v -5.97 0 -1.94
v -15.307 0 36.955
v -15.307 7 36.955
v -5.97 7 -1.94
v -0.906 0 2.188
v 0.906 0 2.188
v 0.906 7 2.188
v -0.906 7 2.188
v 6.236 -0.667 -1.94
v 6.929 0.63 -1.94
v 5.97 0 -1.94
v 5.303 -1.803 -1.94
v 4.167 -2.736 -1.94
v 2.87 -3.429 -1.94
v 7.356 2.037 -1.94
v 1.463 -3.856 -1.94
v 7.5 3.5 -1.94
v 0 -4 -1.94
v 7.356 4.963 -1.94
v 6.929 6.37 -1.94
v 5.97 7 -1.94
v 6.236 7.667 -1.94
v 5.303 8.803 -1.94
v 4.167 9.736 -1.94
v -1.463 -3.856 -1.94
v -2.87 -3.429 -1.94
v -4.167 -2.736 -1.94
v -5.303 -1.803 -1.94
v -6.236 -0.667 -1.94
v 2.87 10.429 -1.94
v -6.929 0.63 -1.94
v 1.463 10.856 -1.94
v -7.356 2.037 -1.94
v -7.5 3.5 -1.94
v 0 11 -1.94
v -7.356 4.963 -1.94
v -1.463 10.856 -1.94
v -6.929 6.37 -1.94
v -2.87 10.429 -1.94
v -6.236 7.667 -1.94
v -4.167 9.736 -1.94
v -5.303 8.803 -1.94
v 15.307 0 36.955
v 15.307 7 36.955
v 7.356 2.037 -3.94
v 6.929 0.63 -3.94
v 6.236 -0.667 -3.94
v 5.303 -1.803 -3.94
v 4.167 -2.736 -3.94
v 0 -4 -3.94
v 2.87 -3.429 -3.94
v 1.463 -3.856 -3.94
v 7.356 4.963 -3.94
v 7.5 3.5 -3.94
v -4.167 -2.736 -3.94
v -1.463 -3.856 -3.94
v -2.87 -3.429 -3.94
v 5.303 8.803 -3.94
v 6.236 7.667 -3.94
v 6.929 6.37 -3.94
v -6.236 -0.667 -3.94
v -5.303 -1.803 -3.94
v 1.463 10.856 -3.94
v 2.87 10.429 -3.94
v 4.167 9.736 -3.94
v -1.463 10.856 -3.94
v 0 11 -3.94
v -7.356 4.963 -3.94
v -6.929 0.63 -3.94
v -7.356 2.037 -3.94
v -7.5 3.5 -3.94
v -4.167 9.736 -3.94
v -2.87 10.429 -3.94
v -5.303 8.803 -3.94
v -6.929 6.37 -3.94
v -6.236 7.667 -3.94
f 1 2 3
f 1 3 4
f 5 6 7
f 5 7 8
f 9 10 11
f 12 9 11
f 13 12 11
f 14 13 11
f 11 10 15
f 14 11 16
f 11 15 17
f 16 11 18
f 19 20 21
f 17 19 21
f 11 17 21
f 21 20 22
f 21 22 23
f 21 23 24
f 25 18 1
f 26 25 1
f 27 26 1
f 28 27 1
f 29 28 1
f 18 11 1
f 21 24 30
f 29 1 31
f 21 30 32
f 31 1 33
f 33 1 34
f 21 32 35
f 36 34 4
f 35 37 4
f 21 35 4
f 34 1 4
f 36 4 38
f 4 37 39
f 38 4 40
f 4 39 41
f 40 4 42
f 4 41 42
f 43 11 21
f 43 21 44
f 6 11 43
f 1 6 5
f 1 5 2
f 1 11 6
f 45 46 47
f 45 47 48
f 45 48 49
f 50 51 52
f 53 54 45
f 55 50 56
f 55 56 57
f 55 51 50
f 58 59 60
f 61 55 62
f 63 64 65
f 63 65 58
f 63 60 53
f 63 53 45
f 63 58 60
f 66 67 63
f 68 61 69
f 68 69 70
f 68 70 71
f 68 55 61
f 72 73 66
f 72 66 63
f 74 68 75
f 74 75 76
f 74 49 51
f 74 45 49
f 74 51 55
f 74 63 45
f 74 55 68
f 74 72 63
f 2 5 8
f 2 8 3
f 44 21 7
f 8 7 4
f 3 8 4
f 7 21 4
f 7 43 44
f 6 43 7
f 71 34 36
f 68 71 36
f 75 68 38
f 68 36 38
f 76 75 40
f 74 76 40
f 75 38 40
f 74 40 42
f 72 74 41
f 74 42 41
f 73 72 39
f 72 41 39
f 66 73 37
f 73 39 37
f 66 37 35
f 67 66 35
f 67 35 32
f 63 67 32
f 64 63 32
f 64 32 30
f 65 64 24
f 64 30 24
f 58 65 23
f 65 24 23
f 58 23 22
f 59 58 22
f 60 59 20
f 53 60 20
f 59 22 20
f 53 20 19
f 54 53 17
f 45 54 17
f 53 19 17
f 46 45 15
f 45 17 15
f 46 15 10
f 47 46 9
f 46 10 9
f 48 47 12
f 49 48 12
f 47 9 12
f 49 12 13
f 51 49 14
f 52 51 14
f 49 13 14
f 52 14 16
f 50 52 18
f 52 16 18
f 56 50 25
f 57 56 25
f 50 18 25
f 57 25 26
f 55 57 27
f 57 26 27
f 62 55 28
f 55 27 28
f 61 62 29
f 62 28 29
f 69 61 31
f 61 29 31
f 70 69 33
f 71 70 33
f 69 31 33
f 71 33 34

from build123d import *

# Parameters (mm, degrees)
BOSS_EXTRUDE1_DEPTH = 7
SKETCH2_R           = 7.5
BOSS_EXTRUDE2_DEPTH = 2


with BuildPart() as part:
    # Sketch1 → Boss-Extrude1 (new body)
    with BuildSketch(Plane(origin=(0, 0, 0), x_dir=(1, 0, 0), z_dir=(0, 1, 0))):
        Polygon((-15.307337295, -36.9551813), (-5.96952274, 1.939615515), (5.96952274, 1.939615515), (15.307337295, -36.9551813), (0.906459551, -2.188386941), (-0.906459551, -2.188386941), align=None)
    extrude(amount=BOSS_EXTRUDE1_DEPTH)

    # Sketch2 → Boss-Extrude2 (add)
    with BuildSketch(Plane(origin=(0, 0, -1.939615515), x_dir=(-1, 0, 0), z_dir=(0, 0, -1))):
        with Locations((0, 3.5)):
            Circle(SKETCH2_R)
    extrude(amount=BOSS_EXTRUDE2_DEPTH)


solid = part.part
